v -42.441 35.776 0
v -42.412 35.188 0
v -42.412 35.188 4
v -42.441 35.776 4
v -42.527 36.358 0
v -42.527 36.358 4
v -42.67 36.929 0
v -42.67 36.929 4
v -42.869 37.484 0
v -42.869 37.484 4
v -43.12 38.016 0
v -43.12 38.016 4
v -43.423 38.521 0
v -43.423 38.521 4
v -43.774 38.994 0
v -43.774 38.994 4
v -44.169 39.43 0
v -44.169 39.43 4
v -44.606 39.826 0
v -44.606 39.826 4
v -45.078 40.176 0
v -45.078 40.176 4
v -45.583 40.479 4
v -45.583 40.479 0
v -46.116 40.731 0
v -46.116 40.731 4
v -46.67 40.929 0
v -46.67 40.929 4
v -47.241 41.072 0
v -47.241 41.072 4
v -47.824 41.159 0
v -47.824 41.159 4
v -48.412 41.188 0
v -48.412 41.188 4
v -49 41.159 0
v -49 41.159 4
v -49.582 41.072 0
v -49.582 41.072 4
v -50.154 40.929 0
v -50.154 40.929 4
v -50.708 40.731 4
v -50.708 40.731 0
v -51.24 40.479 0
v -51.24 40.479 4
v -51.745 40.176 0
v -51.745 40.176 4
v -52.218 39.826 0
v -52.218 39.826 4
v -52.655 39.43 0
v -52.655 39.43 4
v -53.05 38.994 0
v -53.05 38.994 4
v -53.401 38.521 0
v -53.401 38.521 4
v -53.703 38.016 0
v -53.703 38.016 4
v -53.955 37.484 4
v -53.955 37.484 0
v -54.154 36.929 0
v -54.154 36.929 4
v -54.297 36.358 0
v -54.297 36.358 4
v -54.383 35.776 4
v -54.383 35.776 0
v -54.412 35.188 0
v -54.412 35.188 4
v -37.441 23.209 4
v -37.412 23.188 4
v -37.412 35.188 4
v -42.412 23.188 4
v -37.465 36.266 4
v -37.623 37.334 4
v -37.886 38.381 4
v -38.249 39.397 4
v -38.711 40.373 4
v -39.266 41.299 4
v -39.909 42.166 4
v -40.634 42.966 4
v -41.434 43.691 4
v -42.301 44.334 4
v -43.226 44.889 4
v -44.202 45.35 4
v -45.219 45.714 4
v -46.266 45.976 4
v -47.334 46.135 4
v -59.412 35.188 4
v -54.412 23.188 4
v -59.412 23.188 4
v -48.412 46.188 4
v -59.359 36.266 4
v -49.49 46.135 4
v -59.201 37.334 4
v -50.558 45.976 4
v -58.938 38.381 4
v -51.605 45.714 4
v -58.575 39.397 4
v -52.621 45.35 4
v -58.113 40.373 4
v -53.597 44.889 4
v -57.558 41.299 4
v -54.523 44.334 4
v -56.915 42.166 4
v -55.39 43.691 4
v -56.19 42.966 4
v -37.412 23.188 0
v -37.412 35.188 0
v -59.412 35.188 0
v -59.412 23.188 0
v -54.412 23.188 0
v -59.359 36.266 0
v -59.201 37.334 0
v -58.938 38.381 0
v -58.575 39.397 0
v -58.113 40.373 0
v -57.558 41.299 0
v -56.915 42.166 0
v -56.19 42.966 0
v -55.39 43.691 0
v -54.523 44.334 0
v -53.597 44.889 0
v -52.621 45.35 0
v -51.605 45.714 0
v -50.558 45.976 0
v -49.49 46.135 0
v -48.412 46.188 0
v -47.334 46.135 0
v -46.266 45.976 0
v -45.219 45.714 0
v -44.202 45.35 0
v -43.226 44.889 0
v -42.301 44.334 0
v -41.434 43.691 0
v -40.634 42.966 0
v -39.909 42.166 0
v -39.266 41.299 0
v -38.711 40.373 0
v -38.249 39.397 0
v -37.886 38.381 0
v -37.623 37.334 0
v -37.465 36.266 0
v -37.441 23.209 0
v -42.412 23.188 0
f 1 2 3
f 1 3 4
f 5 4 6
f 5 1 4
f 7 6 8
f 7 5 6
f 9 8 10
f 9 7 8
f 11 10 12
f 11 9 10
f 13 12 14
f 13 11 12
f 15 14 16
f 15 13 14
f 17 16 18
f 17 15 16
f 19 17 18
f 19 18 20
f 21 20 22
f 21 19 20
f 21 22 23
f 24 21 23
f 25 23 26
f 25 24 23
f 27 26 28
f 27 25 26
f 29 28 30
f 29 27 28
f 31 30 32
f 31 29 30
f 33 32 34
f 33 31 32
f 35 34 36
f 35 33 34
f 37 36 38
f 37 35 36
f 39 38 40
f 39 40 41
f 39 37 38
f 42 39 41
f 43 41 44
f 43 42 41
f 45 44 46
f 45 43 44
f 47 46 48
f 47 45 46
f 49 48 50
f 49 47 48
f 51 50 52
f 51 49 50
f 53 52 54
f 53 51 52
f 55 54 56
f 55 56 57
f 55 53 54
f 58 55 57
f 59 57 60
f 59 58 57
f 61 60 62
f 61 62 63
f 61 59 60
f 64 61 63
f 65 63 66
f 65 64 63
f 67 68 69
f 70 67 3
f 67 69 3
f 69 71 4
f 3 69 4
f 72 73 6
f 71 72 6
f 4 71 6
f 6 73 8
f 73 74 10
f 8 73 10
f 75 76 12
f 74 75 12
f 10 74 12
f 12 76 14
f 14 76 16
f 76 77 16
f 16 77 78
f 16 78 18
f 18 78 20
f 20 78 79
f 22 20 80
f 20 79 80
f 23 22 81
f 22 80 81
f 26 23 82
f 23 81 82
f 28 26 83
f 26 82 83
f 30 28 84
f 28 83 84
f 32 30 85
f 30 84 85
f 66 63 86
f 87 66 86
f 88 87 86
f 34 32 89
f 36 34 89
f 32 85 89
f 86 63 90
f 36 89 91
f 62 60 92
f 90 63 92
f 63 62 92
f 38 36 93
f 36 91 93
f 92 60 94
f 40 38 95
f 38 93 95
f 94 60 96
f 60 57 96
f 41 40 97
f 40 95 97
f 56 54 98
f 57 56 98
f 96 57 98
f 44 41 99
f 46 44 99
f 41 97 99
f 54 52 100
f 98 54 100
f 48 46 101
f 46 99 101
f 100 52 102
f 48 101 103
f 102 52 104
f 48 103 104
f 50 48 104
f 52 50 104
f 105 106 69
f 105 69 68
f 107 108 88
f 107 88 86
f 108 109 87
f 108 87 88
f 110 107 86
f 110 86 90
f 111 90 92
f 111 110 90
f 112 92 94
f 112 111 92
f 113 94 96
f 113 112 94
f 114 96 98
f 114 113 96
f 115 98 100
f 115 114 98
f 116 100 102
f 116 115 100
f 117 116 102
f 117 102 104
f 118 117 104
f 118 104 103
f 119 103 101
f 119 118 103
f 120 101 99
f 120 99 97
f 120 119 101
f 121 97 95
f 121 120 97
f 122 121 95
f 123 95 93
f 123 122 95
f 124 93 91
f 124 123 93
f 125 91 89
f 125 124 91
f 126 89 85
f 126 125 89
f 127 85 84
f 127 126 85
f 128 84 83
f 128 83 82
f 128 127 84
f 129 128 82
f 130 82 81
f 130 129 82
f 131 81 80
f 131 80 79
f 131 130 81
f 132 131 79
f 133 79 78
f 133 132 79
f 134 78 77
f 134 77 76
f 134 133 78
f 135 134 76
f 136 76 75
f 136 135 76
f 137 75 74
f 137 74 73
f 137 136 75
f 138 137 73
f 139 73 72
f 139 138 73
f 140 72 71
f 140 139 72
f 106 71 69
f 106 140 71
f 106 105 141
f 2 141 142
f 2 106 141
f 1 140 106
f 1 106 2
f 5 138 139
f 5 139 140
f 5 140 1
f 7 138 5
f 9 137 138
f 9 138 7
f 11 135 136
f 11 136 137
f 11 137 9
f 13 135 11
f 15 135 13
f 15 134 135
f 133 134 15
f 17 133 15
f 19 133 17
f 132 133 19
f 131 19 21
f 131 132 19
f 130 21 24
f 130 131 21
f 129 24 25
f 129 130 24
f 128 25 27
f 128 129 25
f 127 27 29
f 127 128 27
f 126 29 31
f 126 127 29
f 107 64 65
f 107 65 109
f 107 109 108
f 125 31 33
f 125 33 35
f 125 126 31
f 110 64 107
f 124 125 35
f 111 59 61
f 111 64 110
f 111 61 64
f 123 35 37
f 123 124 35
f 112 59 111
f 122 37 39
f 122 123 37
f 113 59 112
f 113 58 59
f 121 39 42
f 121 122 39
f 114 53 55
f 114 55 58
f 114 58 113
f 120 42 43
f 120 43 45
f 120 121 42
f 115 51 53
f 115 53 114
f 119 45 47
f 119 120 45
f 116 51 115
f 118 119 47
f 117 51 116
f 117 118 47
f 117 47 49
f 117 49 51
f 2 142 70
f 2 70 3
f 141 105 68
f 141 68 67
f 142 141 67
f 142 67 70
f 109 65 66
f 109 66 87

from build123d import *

# Parameters (mm, degrees)
BOSS_EXTRUDE1_DEPTH = 4


with BuildPart() as part:
    # Sketch2 → Boss-Extrude1 (new body)
    with BuildSketch(Plane.XY):
        with BuildLine():
            Line((-37.411863854, 35.187534323), (-37.411863854, 23.187534323))
            Line((-37.411863854, 23.187534323), (-37.440640728, 23.209290717))
            Line((-37.440640728, 23.209290717), (-42.411863854, 23.187534323))
            Line((-42.411863854, 23.187534323), (-42.411863854, 35.187534323))
            ThreePointArc((-42.411863854, 35.187534323), (-48.411863854, 41.187534323), (-54.411863854, 35.187534323))
            Line((-54.411863854, 35.187534323), (-54.411863854, 23.187534323))
            Line((-54.411863854, 23.187534323), (-59.411863854, 23.187534323))
            Line((-59.411863854, 23.187534323), (-59.411863854, 35.187534323))
            ThreePointArc((-59.411863854, 35.187534323), (-48.411863854, 46.187534323), (-37.411863854, 35.187534323))
        make_face()
    extrude(amount=BOSS_EXTRUDE1_DEPTH)


solid = part.part
